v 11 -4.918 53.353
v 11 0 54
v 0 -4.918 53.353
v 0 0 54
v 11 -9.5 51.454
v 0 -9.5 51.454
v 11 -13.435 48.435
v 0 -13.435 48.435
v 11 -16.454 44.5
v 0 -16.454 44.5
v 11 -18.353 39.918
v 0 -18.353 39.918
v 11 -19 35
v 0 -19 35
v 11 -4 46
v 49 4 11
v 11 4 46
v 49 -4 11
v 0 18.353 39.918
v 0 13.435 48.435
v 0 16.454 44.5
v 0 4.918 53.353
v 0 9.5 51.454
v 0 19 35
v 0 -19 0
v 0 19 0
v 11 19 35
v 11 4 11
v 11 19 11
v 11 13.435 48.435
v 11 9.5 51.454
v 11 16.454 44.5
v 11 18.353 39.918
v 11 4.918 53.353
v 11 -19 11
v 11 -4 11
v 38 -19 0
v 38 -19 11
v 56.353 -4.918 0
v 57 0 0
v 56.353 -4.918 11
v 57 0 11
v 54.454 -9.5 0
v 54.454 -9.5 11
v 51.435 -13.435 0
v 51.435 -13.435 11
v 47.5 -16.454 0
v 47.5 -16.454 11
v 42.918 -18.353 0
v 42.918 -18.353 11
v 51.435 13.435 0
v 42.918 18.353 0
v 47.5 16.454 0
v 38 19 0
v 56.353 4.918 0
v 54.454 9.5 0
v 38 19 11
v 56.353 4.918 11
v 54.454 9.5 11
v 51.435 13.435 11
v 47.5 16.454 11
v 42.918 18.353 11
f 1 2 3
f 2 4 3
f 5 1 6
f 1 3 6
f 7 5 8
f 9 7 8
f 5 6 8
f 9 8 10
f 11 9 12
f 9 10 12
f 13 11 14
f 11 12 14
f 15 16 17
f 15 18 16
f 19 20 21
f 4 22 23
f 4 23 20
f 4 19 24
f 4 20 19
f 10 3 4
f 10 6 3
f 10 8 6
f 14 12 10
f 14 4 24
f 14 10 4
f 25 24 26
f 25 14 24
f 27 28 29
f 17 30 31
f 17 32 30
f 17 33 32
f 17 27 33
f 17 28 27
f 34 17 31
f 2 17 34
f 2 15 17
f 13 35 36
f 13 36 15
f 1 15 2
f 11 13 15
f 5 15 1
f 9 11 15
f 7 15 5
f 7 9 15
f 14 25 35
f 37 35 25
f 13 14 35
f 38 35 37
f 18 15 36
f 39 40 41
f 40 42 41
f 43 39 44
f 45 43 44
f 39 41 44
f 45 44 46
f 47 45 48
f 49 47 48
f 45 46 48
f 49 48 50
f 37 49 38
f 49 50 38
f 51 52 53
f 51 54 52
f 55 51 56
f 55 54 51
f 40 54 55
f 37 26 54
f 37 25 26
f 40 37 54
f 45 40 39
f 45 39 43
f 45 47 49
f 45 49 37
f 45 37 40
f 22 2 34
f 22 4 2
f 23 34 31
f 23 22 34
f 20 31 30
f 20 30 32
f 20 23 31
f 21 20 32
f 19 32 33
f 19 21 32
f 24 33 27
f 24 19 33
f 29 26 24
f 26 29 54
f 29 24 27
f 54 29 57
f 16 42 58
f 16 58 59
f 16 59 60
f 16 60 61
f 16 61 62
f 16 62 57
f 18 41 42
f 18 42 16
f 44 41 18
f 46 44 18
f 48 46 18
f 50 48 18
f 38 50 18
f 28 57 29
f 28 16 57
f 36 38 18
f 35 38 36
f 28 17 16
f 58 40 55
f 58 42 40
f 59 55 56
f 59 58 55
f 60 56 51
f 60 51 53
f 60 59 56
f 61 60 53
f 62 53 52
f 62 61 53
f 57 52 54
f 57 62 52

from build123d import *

# Parameters (mm, degrees)
F1_DEPTH = 19
F2_R     = 18.99999
F4_DEPTH = 4


# Not quite as in the source:
# - a fillet or chamfer is up to 0.001 mm smaller than in the source, because OpenCascade refuses the exact size


with BuildPart() as f1:
    # F0 (on Front) → F1 (new body, symmetric)
    with BuildSketch(Plane.XZ):
        Polygon((0, 54), (0, 0), (57, 0), (57, 11), (11, 11), (11, 54), align=None)
    extrude(amount=F1_DEPTH, both=True)

    # F2 (radius 19 in the source; OpenCascade refuses exactly that, so slightly less here)
    f2_edges = [f1.edges().sort_by_distance(p)[0] for p in [
        (5.5, -19, 54),
        (5.5, 19, 54),
        (57, -19, 5.5),
        (57, 19, 5.5),
    ]]
    fillet(f2_edges, radius=F2_R)

    # F3 (on Front) → F4 (join, symmetric)
    with BuildSketch(Plane.XZ):
        Polygon((49, 11), (11, 46), (11, 35), (11, 11), (38, 11), align=None)
    extrude(amount=F4_DEPTH, both=True)


solid = f1.part
